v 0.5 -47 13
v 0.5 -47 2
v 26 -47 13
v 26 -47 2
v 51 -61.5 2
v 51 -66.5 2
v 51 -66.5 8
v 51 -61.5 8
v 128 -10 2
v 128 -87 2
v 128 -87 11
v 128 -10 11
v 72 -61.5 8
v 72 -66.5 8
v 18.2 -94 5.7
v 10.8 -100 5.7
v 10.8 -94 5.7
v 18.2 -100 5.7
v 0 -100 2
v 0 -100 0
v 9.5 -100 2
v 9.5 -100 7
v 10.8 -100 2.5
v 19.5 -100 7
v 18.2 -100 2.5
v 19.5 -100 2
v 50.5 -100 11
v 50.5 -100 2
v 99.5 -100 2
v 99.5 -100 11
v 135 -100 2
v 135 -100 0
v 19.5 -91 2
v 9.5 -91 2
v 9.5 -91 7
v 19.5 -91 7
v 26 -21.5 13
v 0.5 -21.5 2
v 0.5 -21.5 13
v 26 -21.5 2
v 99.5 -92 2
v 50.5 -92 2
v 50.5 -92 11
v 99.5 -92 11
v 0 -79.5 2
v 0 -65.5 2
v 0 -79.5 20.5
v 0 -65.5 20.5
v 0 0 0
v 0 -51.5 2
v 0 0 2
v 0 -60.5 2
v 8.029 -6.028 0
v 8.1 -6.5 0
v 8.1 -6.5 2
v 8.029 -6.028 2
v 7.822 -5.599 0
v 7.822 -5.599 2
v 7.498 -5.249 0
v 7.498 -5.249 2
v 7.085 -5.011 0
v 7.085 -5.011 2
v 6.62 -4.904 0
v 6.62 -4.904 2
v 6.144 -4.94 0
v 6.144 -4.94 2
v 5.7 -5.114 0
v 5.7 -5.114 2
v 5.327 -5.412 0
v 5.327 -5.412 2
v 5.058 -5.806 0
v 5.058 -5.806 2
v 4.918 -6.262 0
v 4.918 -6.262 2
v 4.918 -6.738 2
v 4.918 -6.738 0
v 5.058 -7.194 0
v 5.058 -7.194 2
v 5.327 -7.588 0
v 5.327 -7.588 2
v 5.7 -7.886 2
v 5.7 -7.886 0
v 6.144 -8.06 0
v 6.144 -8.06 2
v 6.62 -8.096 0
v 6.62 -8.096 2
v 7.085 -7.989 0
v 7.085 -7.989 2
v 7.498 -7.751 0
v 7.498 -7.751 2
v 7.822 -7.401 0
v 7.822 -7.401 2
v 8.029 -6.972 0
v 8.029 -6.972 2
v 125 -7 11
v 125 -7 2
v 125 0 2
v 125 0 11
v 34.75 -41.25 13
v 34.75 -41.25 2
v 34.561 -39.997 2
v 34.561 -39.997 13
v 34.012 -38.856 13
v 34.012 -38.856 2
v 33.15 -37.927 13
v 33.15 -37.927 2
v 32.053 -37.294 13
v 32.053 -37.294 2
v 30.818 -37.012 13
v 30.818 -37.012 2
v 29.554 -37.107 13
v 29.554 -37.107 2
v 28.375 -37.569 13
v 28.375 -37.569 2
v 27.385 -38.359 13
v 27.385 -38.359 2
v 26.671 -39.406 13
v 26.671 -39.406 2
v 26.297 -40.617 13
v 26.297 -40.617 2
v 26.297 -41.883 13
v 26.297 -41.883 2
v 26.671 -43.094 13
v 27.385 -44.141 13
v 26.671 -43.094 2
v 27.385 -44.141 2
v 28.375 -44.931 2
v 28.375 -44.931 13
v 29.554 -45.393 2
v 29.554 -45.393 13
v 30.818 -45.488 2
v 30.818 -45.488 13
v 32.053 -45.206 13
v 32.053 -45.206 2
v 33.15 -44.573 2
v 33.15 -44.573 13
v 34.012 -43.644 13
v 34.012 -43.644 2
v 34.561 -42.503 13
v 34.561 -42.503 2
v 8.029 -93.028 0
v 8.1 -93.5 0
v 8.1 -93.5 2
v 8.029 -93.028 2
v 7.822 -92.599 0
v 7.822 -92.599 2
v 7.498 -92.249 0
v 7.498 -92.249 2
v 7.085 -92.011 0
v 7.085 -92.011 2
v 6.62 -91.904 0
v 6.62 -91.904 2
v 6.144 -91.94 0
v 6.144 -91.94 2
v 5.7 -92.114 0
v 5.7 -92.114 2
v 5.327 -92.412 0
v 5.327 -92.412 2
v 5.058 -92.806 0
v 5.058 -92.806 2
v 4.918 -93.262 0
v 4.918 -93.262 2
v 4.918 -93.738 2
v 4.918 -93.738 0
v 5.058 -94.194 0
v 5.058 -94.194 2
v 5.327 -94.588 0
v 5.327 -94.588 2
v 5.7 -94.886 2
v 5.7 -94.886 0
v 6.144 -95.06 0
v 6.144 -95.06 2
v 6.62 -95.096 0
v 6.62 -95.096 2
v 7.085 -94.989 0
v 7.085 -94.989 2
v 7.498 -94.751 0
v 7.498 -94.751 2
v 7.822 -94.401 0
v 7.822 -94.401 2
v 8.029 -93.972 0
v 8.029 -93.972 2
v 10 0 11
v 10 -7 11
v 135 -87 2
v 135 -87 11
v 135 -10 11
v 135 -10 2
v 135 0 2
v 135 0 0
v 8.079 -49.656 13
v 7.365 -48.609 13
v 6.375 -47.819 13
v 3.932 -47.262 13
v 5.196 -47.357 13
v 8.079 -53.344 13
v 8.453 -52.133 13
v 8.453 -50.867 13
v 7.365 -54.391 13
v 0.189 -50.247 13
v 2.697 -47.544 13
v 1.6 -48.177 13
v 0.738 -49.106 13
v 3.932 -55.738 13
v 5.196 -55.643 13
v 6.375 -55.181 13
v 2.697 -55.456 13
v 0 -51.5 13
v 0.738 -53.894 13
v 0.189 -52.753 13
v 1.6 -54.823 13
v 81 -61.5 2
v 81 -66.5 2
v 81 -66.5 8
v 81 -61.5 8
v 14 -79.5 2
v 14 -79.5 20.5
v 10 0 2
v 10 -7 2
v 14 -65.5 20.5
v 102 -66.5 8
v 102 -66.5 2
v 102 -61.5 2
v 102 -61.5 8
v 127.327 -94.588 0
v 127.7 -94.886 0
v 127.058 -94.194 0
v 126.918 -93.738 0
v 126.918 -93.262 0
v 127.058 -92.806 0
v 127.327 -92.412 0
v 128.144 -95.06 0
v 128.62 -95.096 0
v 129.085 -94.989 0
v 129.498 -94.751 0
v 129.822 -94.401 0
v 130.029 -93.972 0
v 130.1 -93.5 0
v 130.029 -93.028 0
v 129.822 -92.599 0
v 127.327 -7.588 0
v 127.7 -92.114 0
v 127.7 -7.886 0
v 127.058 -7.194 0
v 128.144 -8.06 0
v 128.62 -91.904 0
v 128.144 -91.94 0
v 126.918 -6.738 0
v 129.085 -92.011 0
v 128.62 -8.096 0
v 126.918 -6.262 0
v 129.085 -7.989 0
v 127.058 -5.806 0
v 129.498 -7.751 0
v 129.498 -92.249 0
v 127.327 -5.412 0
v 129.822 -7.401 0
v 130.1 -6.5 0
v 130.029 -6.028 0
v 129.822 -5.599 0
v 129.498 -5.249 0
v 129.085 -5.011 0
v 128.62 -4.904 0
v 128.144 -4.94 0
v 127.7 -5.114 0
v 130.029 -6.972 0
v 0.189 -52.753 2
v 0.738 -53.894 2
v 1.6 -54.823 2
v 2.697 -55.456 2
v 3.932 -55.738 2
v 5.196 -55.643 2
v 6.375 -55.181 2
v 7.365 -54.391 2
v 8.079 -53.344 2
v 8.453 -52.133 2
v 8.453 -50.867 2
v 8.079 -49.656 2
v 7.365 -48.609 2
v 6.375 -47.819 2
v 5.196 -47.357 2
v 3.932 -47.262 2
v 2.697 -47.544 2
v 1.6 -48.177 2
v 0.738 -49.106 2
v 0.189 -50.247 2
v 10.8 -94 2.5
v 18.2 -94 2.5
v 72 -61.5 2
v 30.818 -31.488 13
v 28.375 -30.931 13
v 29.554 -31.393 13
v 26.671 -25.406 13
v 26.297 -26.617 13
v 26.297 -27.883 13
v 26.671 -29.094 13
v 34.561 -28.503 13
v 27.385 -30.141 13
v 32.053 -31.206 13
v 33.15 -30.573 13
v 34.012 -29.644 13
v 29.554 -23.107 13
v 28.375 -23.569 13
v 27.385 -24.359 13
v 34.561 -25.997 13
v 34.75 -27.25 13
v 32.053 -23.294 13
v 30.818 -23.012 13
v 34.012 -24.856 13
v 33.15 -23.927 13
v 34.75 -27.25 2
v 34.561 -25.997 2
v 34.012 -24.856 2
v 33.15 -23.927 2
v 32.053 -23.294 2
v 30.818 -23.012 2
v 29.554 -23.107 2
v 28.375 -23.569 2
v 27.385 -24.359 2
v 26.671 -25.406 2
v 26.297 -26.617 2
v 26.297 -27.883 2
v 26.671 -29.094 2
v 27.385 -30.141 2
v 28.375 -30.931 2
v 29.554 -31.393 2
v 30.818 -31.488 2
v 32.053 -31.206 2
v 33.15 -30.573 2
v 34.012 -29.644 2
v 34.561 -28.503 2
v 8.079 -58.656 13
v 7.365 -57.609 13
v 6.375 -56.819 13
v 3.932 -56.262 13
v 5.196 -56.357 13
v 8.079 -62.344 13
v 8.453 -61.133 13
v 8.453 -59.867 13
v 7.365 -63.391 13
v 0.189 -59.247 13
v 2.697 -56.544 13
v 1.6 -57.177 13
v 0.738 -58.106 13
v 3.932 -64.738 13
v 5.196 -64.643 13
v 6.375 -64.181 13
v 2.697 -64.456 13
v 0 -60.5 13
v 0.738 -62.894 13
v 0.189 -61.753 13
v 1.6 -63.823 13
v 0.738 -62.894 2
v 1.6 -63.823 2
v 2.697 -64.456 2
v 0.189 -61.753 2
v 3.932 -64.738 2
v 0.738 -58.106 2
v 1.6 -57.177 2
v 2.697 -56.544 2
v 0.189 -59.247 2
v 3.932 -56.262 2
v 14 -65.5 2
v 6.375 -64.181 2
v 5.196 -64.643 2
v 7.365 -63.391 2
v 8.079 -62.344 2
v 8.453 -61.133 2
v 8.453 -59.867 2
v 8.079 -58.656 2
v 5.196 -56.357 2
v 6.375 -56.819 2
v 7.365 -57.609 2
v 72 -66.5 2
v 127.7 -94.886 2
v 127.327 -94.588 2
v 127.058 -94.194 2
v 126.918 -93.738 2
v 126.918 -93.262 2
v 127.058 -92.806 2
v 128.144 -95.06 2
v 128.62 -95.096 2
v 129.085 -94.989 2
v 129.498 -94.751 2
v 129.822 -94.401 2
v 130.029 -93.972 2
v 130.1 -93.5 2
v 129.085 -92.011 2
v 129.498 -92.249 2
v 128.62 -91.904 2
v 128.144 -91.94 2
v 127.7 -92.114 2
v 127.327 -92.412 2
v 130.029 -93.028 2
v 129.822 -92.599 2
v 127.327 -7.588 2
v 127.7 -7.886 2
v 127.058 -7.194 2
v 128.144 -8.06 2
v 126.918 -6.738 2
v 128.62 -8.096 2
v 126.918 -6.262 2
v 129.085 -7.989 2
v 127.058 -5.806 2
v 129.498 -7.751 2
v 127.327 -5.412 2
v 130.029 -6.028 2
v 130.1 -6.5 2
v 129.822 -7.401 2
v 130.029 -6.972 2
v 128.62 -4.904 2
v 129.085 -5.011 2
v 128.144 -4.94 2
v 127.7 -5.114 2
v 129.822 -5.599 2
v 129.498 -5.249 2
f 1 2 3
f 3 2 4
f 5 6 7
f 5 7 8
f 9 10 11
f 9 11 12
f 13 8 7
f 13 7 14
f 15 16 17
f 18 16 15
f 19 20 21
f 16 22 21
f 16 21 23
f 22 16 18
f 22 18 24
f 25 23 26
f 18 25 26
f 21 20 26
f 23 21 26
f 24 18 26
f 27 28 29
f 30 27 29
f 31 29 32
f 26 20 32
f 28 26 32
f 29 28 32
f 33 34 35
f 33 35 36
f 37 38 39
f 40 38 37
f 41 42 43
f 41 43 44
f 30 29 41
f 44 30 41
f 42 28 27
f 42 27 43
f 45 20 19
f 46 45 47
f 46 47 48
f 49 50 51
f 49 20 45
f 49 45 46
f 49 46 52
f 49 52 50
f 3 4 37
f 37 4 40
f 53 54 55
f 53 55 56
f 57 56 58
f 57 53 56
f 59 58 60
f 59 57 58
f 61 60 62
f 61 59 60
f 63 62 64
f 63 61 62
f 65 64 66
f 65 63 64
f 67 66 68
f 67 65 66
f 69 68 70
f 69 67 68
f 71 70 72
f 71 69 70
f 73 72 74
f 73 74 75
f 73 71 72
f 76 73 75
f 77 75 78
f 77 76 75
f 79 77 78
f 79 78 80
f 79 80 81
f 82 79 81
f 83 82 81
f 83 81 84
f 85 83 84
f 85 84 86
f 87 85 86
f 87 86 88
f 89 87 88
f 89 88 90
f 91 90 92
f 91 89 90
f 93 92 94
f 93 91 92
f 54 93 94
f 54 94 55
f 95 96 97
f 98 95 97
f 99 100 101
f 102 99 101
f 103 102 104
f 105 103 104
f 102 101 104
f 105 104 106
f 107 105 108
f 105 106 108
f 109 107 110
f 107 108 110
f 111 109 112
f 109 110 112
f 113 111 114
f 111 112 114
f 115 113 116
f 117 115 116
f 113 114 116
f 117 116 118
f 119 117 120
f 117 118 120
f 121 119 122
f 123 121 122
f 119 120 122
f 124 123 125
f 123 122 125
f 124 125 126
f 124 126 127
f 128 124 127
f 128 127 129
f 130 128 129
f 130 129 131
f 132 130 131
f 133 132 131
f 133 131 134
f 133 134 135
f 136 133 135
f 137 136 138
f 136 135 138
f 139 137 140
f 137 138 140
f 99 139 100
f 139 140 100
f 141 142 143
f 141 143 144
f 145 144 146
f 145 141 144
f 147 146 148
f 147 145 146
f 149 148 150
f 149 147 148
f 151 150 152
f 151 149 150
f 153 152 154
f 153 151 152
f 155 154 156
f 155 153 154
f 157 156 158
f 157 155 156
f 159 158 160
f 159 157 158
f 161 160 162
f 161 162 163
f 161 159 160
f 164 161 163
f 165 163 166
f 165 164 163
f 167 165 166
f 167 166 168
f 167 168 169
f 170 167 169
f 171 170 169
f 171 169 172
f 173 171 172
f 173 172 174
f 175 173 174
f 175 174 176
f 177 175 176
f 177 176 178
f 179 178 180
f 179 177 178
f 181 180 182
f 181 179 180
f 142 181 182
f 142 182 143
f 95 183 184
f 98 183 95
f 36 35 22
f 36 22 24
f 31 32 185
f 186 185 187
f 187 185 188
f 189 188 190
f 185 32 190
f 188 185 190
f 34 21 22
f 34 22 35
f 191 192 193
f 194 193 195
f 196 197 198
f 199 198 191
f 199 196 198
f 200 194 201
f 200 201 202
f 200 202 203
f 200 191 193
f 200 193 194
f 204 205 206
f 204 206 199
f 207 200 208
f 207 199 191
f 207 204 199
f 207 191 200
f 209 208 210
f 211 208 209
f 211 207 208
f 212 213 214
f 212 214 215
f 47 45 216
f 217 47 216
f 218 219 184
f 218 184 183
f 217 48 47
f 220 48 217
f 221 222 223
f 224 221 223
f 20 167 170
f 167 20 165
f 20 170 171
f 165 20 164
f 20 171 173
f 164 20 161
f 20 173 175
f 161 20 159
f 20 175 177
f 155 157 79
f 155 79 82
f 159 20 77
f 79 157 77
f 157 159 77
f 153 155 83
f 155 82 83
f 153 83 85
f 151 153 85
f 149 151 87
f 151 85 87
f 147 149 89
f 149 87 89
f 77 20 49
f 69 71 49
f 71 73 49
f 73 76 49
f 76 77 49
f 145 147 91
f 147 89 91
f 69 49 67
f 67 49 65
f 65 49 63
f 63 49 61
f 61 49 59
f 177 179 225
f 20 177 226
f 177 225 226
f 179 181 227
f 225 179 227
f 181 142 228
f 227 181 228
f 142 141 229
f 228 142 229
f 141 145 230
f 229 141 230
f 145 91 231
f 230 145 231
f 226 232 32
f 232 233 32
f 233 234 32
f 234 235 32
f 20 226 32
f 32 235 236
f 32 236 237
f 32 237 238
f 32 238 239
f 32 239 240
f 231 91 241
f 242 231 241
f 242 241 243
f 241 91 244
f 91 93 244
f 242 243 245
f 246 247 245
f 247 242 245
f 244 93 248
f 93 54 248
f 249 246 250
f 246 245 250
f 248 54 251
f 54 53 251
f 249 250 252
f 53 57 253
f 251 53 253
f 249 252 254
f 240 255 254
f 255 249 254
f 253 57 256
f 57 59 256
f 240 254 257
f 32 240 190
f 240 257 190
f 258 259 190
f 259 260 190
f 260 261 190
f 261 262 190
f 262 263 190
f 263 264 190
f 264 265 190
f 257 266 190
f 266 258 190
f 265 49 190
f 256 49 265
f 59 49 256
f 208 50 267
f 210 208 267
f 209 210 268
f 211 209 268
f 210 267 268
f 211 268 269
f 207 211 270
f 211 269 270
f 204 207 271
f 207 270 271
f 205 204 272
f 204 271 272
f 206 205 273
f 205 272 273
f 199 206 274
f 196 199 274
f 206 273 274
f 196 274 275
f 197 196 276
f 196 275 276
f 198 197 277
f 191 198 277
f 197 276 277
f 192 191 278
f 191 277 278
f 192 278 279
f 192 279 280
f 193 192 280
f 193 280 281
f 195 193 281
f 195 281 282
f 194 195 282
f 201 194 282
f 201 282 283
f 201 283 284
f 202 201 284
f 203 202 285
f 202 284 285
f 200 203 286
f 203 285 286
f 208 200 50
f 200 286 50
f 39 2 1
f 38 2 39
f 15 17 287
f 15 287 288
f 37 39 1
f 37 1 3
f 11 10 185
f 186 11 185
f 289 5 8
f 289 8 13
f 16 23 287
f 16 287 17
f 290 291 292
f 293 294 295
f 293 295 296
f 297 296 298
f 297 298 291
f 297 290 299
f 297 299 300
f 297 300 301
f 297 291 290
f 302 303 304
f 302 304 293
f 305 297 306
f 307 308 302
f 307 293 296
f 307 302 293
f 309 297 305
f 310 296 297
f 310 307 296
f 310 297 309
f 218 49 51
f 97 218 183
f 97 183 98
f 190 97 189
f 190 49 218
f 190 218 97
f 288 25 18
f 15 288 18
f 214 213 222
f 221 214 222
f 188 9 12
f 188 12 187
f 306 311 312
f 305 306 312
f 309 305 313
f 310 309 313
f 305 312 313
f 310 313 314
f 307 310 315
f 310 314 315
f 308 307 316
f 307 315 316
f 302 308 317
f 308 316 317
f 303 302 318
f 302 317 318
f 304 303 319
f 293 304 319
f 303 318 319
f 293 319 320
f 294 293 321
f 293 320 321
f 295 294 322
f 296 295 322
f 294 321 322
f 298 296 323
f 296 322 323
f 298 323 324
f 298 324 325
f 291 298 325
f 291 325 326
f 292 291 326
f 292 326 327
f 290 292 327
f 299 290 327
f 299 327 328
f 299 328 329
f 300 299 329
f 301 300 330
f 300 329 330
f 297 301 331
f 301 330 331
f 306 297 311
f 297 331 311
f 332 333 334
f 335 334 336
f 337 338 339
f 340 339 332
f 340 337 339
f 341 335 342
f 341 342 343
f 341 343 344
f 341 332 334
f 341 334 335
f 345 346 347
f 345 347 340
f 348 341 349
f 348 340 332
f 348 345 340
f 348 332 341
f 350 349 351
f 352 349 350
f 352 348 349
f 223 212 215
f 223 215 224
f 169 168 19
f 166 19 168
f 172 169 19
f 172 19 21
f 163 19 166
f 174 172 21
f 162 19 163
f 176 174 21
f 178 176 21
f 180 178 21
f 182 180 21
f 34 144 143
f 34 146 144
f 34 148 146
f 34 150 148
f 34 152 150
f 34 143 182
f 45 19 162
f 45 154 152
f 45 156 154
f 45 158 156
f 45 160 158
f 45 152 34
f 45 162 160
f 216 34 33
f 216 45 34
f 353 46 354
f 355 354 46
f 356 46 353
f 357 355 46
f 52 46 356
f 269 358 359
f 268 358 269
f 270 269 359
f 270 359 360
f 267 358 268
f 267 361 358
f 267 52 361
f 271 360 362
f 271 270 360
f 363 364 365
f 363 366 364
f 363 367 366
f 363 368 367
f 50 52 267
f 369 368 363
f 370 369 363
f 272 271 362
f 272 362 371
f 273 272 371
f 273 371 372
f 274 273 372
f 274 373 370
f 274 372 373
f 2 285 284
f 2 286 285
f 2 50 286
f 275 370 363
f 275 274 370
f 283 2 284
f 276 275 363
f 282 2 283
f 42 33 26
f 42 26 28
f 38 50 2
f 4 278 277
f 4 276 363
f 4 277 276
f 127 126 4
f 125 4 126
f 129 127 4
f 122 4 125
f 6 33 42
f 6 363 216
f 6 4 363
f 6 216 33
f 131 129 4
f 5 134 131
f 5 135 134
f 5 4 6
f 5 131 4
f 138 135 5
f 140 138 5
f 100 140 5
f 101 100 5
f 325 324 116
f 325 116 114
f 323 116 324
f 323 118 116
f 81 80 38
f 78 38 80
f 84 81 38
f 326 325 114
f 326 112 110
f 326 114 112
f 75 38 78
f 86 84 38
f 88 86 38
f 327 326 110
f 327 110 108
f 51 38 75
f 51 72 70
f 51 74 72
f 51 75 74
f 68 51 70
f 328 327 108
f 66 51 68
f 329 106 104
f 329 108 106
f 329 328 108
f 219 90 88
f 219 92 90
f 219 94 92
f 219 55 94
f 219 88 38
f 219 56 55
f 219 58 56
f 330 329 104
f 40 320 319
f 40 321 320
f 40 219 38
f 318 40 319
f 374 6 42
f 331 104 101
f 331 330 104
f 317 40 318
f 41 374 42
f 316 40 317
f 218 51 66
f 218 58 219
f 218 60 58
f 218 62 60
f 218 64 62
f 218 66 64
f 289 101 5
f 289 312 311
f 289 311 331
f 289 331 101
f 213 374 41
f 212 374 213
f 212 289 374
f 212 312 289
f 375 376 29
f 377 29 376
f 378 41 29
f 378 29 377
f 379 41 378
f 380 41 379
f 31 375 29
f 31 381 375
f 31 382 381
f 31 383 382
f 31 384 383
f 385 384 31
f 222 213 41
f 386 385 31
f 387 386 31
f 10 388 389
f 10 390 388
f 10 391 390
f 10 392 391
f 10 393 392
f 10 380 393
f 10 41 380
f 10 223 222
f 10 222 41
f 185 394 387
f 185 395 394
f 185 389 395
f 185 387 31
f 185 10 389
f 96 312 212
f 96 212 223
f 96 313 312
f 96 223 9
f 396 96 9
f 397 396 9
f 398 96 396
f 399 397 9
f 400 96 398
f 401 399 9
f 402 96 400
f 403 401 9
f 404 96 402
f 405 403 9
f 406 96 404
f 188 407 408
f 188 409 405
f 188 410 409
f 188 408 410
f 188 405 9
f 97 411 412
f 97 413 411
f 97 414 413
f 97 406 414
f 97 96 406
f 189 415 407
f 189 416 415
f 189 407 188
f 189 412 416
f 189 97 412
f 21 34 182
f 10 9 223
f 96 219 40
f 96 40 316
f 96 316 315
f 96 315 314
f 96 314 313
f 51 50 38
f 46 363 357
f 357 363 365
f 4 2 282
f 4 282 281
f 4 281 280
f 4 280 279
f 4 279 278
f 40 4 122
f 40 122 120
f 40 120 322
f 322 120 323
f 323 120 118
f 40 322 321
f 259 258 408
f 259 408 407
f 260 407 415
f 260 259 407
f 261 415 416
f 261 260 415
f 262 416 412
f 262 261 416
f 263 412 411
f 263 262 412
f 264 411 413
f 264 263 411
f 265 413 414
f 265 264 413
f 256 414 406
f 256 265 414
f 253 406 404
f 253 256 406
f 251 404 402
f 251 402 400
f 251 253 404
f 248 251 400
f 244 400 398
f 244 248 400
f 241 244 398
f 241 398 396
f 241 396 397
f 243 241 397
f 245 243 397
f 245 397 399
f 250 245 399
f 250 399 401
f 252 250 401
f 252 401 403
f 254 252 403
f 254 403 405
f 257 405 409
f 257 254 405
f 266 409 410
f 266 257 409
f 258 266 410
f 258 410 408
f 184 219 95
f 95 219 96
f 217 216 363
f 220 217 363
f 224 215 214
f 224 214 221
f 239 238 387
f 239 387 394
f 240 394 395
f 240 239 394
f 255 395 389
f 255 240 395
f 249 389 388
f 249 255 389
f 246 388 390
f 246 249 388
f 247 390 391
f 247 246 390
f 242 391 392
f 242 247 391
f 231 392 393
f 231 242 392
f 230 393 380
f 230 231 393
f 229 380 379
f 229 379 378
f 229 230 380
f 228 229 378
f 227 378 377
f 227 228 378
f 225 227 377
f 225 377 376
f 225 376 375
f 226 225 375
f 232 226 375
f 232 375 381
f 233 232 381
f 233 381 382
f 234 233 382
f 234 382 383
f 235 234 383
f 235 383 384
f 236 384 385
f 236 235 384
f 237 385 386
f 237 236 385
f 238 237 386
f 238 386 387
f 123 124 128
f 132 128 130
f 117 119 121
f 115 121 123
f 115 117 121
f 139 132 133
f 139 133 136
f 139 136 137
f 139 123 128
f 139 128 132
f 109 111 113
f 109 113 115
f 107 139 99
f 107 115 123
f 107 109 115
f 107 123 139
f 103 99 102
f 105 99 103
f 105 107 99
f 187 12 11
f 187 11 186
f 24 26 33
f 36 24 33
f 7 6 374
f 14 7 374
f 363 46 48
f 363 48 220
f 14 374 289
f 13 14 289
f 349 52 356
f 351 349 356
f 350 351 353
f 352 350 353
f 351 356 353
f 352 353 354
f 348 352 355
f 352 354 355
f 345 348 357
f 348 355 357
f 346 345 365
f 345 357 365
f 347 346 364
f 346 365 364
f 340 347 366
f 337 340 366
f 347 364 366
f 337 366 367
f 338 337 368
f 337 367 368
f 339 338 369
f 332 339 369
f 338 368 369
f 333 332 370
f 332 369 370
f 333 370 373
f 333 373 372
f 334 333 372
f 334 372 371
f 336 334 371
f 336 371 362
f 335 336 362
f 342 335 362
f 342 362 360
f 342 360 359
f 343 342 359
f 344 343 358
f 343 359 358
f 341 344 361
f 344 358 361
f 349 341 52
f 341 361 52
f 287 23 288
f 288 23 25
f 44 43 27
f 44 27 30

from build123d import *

# Parameters (mm, degrees)
SKETCH_1_W          = 135
SKETCH_1_H          = 100
SKETCH_1_R          = 1.6
EXTRUDE_1_DEPTH     = 2
SKETCH_2_W          = 10
SKETCH_2_H          = 9
EXTRUDE_2_DEPTH     = 5
SKETCH_3_W          = 115
SKETCH_3_H          = 7
EXTRUDE_3_DEPTH     = 9
SKETCH_4_W          = 7
SKETCH_4_H          = 77
EXTRUDE_4_DEPTH     = 9
SKETCH_5_W          = 49
SKETCH_5_H          = 8
EXTRUDE_5_DEPTH     = 9
SKETCH_6_W          = 25.5
SKETCH_6_H          = 25.5
EXTRUDE_6_DEPTH     = 11
SKETCH_6_5_R        = 4.25
EXTRUDE_10_DEPTH    = 11
SKETCH_6_6_W        = 14
SKETCH_6_6_H        = 14
EXTRUDE_11_DEPTH    = 18.5
SKETCH_8_W          = 21
SKETCH_8_H          = 5
EXTRUDE_12_DEPTH    = 6
SKETCH_9_W          = 7.4
SKETCH_9_H          = 3.2
CUT_EXTRUDE_1_DEPTH = 6


with BuildPart() as part:
    # 草图1 → 凸台-拉伸1 (new body)
    with BuildSketch(Plane.XY):
        with Locations((67.5, -50)):
            Rectangle(SKETCH_1_W, SKETCH_1_H)
        with Locations((6.5, -6.5)):
            Circle(SKETCH_1_R, mode=Mode.SUBTRACT)
        with Locations((128.5, -6.5)):
            Circle(SKETCH_1_R, mode=Mode.SUBTRACT)
        with Locations((6.5, -93.5)):
            Circle(SKETCH_1_R, mode=Mode.SUBTRACT)
        with Locations((128.5, -93.5)):
            Circle(SKETCH_1_R, mode=Mode.SUBTRACT)
    extrude(amount=EXTRUDE_1_DEPTH)

    # 草图2 → 凸台-拉伸2 (add)
    with BuildSketch(Plane.XY.offset(2)):
        with Locations((14.5, -95.5)):
            Rectangle(SKETCH_2_W, SKETCH_2_H)
    extrude(amount=EXTRUDE_2_DEPTH)

    # 草图3 → 凸台-拉伸3 (add)
    with BuildSketch(Plane.XY.offset(2)):
        with Locations((67.5, -3.5)):
            Rectangle(SKETCH_3_W, SKETCH_3_H)
    extrude(amount=EXTRUDE_3_DEPTH)

    # 草图4 → 凸台-拉伸4 (add)
    with BuildSketch(Plane.XY.offset(2)):
        with Locations((131.5, -48.5)):
            Rectangle(SKETCH_4_W, SKETCH_4_H)
    extrude(amount=EXTRUDE_4_DEPTH)

    # 草图5 → 凸台-拉伸5 (add)
    with BuildSketch(Plane.XY.offset(2)):
        with Locations((75, -96)):
            Rectangle(SKETCH_5_W, SKETCH_5_H)
    extrude(amount=EXTRUDE_5_DEPTH)

    # 草图6 → 凸台-拉伸6 (add)
    with BuildSketch(Plane.XY.offset(2)):
        with Locations((13.25, -34.25)):
            Rectangle(SKETCH_6_W, SKETCH_6_H)
    extrude(amount=EXTRUDE_6_DEPTH)

    # 草图6<5> → 凸台-拉伸10 (add)
    with BuildSketch(Plane.XY.offset(2)):
        with Locations((30.5, -27.25)):
            Circle(SKETCH_6_5_R)
        with Locations((30.5, -41.25)):
            Circle(SKETCH_6_5_R)
        with Locations((4.25, -60.5)):
            Circle(SKETCH_6_5_R)
        with Locations((4.25, -51.5)):
            Circle(SKETCH_6_5_R)
    extrude(amount=EXTRUDE_10_DEPTH)

    # 草图6<6> → 凸台-拉伸11 (add)
    with BuildSketch(Plane.XY.offset(2)):
        with Locations((7, -72.5)):
            Rectangle(SKETCH_6_6_W, SKETCH_6_6_H)
    extrude(amount=EXTRUDE_11_DEPTH)

    # 草图8 → 凸台-拉伸12 (add)
    with BuildSketch(Plane.XY.offset(2)):
        with Locations((61.5, -64)):
            Rectangle(SKETCH_8_W, SKETCH_8_H)
        with Locations((91.5, -64)):
            Rectangle(SKETCH_8_W, SKETCH_8_H)
    extrude(amount=EXTRUDE_12_DEPTH)

    # 草图9 → 切除-拉伸1 (cut)
    with BuildSketch(Plane.XZ.offset(100)):
        with Locations((14.5, 4.1)):
            Rectangle(SKETCH_9_W, SKETCH_9_H)
    extrude(amount=-CUT_EXTRUDE_1_DEPTH, mode=Mode.SUBTRACT)


solid = part.part
